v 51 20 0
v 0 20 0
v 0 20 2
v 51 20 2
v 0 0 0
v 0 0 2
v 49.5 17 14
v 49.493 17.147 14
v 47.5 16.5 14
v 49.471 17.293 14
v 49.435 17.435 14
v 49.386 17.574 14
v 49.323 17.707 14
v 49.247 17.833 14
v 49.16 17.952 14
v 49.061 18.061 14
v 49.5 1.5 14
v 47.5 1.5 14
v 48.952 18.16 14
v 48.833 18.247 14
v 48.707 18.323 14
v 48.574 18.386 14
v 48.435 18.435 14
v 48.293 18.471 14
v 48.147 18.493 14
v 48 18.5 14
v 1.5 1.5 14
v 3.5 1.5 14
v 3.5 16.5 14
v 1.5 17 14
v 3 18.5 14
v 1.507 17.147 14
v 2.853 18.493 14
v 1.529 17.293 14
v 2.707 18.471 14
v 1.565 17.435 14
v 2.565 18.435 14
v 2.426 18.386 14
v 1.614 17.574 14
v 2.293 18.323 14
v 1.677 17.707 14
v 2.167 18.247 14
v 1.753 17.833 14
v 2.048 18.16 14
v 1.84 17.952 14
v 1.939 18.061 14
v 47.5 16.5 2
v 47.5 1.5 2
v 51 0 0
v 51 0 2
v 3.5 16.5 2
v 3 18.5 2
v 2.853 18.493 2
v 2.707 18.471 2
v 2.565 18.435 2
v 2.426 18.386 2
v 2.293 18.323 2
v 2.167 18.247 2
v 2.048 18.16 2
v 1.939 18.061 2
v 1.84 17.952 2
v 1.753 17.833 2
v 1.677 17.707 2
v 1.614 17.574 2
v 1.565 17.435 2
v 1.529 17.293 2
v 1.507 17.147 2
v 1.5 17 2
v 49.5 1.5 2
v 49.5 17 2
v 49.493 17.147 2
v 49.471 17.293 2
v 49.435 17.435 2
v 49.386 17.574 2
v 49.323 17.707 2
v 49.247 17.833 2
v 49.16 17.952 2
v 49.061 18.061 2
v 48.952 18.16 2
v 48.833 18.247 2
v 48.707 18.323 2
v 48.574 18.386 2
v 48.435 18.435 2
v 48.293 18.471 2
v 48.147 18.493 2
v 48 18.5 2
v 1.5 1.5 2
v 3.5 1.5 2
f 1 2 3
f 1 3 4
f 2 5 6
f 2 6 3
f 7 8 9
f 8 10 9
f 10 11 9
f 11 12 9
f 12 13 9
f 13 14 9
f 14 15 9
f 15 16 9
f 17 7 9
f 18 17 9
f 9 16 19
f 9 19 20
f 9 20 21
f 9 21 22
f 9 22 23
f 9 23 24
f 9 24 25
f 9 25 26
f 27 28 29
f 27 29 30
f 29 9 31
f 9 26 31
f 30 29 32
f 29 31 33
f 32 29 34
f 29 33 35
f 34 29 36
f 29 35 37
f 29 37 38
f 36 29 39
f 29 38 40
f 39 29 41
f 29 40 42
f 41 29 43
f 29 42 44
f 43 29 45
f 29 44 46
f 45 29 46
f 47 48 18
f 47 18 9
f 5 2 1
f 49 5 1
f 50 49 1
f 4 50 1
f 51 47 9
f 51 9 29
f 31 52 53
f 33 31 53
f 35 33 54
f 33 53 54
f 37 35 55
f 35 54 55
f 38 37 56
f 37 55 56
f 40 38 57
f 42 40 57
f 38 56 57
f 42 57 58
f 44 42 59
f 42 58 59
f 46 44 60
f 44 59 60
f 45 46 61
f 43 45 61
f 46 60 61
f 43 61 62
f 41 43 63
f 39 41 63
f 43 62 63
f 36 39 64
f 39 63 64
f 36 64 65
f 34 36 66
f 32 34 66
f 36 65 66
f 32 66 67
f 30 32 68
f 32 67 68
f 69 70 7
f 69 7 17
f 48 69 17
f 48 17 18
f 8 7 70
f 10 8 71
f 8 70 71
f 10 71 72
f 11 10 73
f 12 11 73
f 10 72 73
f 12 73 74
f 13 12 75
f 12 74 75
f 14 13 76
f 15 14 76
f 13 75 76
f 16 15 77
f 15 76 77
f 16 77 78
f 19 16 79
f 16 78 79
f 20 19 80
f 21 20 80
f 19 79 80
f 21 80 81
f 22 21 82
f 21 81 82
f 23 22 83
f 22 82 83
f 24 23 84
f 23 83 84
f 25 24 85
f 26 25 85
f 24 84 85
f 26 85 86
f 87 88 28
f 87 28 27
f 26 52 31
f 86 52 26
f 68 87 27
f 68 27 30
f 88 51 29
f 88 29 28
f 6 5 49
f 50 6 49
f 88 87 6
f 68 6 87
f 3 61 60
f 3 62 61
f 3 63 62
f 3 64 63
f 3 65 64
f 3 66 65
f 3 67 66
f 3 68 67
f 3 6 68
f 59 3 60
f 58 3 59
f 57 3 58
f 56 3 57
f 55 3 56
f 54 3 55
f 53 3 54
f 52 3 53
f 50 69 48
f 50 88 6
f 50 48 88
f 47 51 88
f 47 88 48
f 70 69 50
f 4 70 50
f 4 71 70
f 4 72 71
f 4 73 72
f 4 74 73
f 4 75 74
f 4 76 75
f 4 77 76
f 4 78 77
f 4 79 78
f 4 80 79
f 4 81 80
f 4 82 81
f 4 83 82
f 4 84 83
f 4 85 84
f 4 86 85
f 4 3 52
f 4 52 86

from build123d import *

# Parameters (mm, degrees)
SKETCH_W     = 51
SKETCH_H     = 20
PAD_DEPTH    = 2
PAD001_DEPTH = 12


with BuildPart() as part:
    # Sketch → Pad (new body)
    with BuildSketch(Plane.XY):
        with Locations((25.5, 10)):
            Rectangle(SKETCH_W, SKETCH_H)
    extrude(amount=PAD_DEPTH)

    # Sketch001 (on Face6 of Pad) → Pad001 (join)
    with BuildSketch(Plane.XY.offset(2)):
        with BuildLine():
            Line((1.5, 1.5), (1.5, 17))
            ThreePointArc((3, 18.5), (1.93934, 18.06066), (1.5, 17))
            Line((3, 18.5), (48, 18.5))
            ThreePointArc((49.5, 17), (49.06066, 18.06066), (48, 18.5))
            Line((49.5, 17), (49.5, 1.5))
            Line((49.5, 1.5), (47.5, 1.5))
            Line((47.5, 1.5), (47.5, 16.5))
            Line((47.5, 16.5), (3.5, 16.5))
            Line((3.5, 16.5), (3.5, 1.5))
            Line((3.5, 1.5), (1.5, 1.5))
        make_face()
    extrude(amount=PAD001_DEPTH)


solid = part.part
